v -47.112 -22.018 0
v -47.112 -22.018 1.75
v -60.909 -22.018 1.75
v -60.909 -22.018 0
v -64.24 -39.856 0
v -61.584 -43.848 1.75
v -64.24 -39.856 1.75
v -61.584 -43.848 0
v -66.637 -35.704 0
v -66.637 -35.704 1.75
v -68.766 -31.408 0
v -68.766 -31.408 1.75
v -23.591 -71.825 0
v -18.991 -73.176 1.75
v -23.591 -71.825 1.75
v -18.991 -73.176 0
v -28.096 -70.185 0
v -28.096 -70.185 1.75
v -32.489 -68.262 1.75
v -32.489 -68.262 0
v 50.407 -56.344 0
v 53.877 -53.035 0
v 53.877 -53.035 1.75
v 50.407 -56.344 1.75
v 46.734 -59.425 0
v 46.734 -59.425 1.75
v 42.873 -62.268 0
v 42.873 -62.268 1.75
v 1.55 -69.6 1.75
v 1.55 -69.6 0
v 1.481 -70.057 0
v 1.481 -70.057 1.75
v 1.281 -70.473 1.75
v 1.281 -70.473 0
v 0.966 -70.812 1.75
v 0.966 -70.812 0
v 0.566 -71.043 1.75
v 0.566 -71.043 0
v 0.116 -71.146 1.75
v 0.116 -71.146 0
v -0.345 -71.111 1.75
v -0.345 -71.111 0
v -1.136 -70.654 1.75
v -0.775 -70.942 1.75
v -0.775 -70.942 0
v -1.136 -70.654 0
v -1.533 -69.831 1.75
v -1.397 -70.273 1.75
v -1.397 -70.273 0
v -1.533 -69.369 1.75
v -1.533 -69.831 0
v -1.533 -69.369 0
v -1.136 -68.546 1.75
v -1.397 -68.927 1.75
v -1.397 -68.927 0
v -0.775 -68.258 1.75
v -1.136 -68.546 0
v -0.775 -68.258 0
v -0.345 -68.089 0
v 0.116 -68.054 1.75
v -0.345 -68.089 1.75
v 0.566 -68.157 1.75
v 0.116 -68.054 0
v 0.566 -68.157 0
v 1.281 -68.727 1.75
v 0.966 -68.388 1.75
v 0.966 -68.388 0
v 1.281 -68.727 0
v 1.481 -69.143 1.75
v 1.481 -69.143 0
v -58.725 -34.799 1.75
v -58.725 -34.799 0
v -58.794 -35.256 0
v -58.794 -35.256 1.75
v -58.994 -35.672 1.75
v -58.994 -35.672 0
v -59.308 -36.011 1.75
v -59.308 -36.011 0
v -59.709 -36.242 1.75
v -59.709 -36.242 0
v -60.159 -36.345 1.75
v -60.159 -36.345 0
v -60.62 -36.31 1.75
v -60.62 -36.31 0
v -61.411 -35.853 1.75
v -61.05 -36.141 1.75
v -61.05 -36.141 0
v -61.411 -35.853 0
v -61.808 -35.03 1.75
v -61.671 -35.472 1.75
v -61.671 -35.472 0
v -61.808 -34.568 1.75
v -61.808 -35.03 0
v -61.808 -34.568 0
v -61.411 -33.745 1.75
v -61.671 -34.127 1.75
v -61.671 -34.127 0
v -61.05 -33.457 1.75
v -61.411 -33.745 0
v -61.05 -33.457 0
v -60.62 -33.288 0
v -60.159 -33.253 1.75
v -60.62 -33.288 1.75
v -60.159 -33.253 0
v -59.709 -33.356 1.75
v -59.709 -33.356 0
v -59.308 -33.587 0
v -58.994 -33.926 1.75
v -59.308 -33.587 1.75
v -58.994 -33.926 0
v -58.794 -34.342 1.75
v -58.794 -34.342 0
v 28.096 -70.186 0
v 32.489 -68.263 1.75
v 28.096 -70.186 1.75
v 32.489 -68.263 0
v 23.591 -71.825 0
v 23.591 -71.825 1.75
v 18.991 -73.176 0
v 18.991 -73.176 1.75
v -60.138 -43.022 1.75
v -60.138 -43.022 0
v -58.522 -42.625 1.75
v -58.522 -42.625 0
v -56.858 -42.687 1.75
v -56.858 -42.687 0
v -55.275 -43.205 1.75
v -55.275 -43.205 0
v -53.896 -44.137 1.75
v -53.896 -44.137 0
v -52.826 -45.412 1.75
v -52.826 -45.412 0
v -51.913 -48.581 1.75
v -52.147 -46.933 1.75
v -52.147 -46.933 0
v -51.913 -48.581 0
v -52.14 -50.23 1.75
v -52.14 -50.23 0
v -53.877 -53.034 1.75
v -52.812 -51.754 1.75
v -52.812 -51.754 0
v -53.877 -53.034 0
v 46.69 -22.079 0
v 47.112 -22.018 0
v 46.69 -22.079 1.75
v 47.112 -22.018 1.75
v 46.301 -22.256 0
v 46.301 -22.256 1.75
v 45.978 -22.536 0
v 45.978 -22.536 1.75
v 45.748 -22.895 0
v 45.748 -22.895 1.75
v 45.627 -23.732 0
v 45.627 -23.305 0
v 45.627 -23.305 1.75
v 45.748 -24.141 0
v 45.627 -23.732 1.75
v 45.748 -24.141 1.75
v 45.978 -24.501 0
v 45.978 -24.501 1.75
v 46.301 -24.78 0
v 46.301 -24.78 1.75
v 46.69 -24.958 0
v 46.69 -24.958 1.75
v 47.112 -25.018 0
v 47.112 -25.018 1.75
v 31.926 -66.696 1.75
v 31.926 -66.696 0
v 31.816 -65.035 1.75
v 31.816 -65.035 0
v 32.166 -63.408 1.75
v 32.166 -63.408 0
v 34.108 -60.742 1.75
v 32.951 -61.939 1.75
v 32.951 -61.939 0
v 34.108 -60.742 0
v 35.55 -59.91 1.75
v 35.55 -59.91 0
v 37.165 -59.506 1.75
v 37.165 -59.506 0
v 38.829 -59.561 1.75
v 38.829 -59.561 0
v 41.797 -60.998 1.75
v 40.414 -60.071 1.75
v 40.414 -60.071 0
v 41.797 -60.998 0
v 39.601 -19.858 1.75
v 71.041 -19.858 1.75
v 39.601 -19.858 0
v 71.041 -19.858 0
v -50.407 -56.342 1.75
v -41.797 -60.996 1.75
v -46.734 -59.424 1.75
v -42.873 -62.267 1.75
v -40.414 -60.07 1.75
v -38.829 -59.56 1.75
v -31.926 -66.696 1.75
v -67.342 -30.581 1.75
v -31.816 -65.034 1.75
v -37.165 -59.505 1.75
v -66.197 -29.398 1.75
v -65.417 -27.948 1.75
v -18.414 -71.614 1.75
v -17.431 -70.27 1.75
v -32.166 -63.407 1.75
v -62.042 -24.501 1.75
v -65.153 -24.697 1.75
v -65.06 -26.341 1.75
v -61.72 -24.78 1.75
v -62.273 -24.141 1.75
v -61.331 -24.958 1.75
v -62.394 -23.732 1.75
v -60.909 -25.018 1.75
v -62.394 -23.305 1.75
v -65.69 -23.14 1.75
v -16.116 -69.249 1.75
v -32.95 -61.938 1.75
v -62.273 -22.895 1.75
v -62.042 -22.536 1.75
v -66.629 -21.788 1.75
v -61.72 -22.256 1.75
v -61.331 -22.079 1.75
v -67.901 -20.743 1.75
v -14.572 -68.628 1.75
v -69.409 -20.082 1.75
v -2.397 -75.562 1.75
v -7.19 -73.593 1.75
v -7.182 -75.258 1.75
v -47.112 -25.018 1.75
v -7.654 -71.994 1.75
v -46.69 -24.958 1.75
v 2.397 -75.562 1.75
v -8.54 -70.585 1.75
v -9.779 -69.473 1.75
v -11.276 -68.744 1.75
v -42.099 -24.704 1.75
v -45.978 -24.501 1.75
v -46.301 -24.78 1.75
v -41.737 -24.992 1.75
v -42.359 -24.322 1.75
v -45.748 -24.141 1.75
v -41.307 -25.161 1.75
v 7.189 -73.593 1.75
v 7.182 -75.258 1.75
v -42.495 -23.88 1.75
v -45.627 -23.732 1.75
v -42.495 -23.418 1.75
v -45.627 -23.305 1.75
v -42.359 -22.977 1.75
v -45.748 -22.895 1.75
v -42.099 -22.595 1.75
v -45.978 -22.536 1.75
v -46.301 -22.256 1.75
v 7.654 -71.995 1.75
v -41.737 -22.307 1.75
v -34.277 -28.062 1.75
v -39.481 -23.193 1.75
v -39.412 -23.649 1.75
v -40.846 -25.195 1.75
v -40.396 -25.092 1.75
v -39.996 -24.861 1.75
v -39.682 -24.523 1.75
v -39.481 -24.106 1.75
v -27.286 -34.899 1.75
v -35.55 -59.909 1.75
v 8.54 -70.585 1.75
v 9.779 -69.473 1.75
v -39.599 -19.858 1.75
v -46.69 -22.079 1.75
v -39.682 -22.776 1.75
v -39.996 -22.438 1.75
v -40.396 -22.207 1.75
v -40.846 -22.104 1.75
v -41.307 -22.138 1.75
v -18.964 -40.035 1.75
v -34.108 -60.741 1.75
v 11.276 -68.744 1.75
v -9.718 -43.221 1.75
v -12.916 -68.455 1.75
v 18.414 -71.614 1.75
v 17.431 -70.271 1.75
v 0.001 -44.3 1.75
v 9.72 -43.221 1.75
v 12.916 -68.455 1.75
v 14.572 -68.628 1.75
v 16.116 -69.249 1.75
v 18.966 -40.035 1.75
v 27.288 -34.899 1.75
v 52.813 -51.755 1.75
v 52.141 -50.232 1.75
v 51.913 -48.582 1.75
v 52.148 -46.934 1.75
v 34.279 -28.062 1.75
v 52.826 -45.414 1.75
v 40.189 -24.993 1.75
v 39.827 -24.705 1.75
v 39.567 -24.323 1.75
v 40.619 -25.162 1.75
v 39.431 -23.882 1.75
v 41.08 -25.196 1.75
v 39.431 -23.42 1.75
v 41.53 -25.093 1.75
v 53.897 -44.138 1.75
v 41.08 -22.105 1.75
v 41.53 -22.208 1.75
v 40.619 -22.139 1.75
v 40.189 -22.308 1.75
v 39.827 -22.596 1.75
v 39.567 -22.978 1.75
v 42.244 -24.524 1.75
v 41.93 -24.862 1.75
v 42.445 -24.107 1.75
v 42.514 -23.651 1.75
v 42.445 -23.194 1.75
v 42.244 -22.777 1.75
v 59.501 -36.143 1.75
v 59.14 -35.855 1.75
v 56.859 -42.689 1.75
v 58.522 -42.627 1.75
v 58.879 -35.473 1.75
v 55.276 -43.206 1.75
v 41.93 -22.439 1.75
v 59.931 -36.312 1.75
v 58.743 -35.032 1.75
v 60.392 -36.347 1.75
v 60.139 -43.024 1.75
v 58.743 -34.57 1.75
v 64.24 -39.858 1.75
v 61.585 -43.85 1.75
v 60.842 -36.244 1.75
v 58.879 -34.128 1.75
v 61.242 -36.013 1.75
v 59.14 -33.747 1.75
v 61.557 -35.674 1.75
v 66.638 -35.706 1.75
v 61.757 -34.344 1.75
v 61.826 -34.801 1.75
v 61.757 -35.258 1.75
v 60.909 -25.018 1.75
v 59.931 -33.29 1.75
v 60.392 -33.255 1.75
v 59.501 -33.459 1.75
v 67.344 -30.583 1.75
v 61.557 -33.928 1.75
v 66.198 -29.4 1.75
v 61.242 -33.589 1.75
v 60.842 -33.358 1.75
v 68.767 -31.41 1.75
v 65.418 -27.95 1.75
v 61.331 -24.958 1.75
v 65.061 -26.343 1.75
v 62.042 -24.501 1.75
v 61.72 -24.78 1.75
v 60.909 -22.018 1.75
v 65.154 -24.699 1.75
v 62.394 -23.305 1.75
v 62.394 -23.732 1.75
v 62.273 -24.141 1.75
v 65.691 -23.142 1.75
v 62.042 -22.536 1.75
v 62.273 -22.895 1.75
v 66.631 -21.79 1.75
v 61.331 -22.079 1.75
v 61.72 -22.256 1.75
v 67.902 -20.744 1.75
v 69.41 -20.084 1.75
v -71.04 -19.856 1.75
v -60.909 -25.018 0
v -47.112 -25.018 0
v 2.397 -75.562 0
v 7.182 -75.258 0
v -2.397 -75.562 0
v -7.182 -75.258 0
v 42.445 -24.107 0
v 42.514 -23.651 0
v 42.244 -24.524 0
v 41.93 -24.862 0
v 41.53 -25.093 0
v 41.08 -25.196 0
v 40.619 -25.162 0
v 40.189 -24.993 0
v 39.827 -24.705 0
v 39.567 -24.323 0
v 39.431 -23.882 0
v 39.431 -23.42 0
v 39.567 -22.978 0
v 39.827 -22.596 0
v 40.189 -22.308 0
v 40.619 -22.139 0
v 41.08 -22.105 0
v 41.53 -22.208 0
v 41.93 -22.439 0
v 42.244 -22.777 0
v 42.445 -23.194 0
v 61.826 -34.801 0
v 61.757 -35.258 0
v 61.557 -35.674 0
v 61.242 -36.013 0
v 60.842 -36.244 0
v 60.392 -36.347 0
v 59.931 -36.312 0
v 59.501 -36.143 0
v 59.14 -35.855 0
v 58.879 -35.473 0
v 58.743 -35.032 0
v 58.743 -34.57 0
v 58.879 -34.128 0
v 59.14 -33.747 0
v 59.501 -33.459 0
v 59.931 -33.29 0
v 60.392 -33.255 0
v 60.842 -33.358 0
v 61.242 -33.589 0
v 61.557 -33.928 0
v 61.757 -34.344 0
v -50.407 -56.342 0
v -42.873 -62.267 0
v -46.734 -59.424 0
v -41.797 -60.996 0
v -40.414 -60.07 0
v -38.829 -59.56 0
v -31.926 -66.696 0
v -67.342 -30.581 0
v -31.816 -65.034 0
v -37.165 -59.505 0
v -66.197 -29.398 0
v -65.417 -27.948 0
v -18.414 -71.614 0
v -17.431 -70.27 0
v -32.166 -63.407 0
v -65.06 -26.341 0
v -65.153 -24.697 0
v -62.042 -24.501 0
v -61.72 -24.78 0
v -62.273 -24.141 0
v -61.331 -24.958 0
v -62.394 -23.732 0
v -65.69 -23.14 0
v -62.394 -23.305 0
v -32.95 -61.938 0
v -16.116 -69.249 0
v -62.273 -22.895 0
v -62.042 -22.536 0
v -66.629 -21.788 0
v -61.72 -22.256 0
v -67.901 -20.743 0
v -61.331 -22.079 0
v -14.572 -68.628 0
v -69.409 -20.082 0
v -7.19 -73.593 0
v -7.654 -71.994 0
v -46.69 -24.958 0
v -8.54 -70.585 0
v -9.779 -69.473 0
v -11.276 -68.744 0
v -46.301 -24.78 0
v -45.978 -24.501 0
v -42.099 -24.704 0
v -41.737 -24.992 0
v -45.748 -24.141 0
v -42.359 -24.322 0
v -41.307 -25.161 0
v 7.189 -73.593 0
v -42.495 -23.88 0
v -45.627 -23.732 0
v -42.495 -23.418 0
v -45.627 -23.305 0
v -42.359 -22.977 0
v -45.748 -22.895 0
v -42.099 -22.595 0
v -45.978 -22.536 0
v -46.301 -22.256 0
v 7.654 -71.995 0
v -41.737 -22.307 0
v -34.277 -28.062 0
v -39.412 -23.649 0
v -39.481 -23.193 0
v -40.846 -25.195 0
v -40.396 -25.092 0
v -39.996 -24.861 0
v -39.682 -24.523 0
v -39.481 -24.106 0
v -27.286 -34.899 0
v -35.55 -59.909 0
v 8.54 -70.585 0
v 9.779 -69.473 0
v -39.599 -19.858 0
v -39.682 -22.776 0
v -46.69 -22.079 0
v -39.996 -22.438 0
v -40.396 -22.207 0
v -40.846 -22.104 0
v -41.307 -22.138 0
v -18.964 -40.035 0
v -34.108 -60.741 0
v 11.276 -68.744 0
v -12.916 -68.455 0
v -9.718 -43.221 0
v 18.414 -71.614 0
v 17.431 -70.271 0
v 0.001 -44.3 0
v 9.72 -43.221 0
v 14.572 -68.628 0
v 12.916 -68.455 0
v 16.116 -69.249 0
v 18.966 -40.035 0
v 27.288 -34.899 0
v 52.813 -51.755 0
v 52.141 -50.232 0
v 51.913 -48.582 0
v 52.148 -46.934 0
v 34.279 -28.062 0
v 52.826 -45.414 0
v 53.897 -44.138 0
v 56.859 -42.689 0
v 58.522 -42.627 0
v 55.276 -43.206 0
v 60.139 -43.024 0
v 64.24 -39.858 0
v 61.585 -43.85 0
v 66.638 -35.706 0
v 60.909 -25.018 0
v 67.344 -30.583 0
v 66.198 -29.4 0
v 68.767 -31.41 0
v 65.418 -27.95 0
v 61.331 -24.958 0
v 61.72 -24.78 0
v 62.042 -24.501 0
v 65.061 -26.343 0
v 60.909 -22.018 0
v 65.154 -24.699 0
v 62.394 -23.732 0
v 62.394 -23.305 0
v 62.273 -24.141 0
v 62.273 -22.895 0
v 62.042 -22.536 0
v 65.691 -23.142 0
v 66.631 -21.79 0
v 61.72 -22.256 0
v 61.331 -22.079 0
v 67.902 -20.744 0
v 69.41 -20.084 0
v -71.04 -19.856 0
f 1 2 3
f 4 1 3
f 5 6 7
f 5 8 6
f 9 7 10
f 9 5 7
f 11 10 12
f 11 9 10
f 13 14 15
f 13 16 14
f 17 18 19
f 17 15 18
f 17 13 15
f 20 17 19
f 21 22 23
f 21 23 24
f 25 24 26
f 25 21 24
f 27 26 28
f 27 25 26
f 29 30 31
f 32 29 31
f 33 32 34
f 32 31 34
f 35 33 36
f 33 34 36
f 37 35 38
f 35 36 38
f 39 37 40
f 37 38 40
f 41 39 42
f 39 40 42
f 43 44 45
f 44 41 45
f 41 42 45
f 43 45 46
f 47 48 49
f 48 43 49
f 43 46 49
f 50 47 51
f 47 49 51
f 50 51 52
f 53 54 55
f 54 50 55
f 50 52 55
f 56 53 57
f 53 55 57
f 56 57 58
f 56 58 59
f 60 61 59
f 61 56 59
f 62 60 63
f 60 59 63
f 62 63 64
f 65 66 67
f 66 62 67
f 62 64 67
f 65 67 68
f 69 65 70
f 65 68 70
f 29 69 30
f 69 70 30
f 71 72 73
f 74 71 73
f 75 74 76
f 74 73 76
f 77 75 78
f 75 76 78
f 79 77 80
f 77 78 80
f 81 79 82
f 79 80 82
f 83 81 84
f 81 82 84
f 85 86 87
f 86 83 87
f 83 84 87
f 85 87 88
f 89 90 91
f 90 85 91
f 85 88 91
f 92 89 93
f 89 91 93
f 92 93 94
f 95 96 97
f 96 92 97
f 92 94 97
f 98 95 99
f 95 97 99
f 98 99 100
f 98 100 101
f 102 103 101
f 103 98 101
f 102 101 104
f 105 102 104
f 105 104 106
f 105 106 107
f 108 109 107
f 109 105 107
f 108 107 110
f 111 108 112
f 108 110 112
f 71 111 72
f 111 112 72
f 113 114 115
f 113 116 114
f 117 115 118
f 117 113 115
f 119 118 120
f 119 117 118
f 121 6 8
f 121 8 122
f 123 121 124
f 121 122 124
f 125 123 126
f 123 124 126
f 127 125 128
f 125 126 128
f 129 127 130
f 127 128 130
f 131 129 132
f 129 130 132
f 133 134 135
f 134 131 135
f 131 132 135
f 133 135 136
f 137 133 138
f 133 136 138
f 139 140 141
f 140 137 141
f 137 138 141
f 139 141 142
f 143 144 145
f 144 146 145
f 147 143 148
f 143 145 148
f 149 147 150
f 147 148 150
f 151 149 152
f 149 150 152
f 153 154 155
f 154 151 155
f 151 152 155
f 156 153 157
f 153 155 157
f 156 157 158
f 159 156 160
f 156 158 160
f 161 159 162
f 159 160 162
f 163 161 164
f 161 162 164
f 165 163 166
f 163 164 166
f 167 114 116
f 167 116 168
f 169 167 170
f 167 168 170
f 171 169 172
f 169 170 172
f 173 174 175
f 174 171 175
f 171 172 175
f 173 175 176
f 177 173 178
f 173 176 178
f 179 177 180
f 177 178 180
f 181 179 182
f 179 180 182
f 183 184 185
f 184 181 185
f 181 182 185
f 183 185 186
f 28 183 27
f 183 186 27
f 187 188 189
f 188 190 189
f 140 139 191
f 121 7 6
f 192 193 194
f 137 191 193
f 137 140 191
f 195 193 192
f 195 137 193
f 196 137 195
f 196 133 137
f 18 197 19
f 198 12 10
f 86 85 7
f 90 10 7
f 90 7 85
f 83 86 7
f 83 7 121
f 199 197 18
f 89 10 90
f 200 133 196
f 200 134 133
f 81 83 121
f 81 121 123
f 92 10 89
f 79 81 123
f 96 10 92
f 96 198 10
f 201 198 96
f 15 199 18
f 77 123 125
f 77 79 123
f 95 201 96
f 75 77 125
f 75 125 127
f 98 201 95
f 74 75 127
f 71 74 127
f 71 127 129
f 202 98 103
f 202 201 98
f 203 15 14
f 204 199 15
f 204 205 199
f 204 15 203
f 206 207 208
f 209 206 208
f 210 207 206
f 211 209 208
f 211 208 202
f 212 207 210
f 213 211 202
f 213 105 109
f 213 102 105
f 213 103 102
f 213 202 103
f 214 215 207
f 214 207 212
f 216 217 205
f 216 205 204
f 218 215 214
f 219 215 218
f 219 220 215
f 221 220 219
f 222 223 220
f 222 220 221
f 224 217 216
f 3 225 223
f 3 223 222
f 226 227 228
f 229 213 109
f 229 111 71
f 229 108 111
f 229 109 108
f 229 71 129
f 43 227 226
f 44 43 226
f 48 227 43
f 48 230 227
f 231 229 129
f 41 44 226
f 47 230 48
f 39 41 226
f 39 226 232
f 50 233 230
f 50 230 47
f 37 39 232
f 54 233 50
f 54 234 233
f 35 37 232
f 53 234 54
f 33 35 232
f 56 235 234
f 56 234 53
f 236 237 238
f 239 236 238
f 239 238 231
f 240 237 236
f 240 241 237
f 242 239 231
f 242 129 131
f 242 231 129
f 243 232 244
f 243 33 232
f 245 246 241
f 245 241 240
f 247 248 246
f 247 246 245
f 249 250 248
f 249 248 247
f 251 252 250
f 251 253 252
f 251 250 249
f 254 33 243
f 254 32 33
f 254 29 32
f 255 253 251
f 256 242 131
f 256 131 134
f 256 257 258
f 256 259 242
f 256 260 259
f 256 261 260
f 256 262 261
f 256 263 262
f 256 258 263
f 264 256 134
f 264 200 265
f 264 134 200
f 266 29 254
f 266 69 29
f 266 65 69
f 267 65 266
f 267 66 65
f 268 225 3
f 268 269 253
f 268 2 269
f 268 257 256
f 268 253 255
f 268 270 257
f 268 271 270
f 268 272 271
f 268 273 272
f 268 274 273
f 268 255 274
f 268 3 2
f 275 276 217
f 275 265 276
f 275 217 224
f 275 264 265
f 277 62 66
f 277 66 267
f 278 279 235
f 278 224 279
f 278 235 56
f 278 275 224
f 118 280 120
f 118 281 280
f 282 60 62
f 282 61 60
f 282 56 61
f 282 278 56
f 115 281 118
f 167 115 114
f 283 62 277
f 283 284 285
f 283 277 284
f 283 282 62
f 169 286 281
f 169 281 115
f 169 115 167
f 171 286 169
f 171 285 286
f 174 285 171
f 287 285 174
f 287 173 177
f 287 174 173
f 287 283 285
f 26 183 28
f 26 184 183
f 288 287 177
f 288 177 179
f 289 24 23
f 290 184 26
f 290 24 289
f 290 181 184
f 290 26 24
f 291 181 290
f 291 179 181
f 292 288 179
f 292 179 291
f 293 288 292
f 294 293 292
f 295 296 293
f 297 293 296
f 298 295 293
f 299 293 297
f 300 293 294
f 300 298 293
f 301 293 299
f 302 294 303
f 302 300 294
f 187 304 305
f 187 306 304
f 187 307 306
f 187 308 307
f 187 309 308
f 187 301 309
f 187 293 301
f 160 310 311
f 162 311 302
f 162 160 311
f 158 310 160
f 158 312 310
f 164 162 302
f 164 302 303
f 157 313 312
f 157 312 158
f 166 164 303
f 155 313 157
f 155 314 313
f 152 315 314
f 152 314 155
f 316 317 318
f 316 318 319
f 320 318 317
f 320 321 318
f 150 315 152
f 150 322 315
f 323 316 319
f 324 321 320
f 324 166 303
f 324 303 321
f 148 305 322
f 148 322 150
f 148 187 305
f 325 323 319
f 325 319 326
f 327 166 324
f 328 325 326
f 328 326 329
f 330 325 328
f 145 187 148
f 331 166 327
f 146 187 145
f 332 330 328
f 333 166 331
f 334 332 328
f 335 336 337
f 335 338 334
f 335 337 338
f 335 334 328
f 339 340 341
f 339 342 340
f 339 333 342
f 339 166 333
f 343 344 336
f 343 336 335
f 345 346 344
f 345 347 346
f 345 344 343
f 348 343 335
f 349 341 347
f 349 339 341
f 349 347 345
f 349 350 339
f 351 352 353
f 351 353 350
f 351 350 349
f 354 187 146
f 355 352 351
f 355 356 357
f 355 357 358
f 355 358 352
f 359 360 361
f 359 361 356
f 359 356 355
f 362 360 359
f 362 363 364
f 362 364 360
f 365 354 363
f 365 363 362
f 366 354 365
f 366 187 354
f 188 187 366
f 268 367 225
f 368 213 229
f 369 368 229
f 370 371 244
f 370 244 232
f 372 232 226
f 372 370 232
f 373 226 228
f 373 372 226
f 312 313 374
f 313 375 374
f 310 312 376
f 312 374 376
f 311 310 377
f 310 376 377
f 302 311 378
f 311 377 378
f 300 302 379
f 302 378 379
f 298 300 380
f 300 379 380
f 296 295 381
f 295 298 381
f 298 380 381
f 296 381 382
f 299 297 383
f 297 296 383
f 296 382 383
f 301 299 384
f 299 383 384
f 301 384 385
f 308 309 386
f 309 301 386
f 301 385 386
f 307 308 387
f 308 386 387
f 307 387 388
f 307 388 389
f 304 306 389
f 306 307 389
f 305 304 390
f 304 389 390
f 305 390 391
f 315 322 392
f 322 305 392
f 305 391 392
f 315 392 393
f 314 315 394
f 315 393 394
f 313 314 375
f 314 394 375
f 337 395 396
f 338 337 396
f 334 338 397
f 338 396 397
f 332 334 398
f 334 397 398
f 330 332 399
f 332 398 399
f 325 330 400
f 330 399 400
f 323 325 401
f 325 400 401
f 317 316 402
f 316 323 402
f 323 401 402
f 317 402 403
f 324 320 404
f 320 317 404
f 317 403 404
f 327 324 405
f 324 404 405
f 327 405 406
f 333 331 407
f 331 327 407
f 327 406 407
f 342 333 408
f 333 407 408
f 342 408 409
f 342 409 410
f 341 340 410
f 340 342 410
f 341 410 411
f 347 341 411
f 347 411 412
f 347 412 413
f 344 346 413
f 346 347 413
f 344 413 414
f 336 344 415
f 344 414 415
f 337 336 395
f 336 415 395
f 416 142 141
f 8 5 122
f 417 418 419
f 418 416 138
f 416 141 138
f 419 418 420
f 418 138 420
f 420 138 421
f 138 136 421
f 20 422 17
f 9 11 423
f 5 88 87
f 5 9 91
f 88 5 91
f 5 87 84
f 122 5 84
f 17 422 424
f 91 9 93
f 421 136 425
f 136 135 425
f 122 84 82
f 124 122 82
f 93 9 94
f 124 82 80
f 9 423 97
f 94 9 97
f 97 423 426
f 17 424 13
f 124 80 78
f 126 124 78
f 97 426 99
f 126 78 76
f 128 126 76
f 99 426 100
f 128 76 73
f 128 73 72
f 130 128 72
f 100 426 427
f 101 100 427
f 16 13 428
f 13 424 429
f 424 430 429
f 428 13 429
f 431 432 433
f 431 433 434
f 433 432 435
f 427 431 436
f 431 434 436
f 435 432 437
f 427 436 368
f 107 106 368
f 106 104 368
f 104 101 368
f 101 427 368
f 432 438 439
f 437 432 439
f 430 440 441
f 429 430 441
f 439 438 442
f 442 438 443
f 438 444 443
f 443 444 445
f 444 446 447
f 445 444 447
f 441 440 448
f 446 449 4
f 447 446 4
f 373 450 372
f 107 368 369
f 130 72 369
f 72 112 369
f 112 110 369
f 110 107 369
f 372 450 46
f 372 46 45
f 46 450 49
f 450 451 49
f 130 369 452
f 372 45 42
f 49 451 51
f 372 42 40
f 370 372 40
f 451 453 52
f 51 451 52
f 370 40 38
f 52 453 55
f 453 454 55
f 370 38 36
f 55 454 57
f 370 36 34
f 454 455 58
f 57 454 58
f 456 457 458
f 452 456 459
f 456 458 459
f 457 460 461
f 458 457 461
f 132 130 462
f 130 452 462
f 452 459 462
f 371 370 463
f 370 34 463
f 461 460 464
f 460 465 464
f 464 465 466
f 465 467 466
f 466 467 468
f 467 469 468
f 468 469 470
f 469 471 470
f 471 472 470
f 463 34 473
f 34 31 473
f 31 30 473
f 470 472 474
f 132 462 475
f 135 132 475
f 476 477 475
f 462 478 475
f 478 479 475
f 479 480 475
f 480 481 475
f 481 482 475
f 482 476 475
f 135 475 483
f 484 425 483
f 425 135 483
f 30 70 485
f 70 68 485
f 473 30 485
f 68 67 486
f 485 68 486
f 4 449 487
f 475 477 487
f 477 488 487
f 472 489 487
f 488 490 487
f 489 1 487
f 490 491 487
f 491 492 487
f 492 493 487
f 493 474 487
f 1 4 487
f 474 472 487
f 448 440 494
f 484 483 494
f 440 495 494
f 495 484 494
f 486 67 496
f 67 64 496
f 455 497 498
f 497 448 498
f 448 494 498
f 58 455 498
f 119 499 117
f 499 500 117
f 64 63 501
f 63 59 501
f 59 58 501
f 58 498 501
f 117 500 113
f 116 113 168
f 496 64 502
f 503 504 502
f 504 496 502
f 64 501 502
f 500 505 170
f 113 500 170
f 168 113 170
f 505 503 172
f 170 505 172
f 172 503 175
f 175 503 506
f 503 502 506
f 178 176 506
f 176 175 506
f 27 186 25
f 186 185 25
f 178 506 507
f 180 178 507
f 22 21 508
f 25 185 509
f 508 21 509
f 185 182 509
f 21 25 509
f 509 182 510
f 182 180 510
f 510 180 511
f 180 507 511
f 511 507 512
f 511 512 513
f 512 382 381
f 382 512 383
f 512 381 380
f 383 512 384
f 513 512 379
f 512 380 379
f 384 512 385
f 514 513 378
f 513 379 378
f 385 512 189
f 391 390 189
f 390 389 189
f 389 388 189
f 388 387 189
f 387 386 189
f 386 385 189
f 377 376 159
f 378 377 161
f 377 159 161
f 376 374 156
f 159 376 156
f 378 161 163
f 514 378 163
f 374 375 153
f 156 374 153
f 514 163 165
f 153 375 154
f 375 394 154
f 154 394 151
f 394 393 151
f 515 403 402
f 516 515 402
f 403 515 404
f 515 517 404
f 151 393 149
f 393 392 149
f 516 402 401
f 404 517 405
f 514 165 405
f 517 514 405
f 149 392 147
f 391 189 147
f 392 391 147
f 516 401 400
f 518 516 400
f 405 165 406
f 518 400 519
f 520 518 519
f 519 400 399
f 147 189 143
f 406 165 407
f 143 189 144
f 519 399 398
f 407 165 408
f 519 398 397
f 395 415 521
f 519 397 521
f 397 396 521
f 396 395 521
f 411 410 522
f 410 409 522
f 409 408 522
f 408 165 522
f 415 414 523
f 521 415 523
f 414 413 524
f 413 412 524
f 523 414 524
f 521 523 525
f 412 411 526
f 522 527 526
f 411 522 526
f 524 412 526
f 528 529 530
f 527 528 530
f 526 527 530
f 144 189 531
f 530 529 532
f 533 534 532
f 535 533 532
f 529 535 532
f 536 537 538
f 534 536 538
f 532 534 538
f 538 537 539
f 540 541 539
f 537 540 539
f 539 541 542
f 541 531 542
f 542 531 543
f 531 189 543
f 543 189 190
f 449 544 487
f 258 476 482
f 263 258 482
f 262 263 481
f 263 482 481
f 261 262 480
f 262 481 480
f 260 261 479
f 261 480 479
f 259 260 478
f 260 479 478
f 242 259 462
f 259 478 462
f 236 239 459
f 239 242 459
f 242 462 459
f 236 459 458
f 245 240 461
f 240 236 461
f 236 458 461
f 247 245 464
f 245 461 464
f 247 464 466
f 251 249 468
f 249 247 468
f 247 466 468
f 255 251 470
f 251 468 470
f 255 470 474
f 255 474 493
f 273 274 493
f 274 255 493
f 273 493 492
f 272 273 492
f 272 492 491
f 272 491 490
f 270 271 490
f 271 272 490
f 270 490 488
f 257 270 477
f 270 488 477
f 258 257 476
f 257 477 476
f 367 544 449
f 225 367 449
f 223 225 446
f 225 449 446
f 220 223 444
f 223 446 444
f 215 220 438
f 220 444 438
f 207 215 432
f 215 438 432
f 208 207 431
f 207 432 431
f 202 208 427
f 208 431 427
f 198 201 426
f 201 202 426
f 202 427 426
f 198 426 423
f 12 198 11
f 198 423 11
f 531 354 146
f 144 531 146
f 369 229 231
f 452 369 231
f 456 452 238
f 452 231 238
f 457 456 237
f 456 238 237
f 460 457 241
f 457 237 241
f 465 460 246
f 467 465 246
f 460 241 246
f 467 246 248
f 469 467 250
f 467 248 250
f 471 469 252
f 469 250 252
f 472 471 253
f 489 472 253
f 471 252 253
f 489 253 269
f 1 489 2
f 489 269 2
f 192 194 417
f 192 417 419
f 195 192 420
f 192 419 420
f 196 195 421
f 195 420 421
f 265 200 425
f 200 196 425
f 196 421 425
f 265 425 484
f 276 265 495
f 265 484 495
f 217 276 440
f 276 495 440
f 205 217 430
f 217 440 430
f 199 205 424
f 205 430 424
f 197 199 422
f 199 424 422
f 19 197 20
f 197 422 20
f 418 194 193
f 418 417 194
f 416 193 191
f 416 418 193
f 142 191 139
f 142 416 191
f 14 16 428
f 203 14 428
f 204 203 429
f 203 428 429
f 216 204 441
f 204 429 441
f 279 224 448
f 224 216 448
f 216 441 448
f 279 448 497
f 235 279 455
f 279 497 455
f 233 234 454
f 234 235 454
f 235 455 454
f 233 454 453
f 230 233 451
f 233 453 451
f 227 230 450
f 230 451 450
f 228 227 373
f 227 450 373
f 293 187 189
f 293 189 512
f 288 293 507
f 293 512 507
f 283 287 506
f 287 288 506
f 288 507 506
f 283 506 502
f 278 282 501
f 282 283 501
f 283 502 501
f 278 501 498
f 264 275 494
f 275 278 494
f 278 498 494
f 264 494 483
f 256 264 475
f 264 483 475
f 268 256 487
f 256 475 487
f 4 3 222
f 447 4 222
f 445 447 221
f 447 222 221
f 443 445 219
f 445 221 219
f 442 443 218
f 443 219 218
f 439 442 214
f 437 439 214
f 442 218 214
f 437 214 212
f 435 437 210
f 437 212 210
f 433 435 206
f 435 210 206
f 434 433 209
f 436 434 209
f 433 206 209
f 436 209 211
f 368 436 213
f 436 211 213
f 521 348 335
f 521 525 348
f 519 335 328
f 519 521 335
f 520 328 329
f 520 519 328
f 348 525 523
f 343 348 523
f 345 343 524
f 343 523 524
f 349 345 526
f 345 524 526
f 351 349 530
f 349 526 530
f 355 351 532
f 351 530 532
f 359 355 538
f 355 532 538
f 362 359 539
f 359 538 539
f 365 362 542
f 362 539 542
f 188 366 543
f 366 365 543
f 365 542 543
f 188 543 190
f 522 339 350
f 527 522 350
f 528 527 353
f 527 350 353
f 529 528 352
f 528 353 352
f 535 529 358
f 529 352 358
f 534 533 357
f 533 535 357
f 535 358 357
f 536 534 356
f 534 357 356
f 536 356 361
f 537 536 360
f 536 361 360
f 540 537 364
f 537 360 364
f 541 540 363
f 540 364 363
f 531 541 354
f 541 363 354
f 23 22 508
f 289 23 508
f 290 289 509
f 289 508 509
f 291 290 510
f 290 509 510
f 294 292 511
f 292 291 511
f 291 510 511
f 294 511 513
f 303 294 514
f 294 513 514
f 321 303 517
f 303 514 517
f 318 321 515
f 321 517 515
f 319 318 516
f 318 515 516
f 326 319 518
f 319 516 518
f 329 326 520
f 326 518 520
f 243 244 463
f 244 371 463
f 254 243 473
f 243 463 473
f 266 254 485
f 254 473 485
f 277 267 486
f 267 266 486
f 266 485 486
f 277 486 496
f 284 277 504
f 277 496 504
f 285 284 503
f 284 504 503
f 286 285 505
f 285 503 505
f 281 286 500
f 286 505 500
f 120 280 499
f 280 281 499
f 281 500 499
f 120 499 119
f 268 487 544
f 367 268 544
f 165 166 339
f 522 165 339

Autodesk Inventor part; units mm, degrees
ref_plane "YZ Plane" through (0, 0, 0) normal (1, 0, 0) x (0, 1, 0)
ref_plane "XZ Plane" through (0, 0, 0) normal (0, 1, 0) x (-1, 0, 0)
ref_plane "XY Plane" through (0, 0, 0) normal (0, 0, 1) x (1, 0, 0)
sketch "Sketch1" plane through (0, 0, 0) normal (0, 0, 1) x (1, 0, 0)
  circle A0 centre (46.9462, 34.742) radius 1.05 projected
  circle A1 centre (53.415, 34.1058) radius 1.05 projected
  circle A2 centre (-46.9442, -34.742) radius 1.05 construction
  circle A3 centre (-53.413, -34.1058) radius 1.05 construction
  arc A4 (72.8682, -20.1426) -> (68.7671, -31.41) centre (71.0414, -25.8577) ccw projected
  arc A5 (72.8682, -20.1426) -> (72.8688, 20.1405) centre (0.001, 0) ccw projected
  arc A6 (68.768, 31.408) -> (72.8688, 20.1405) centre (71.0421, 25.8557) ccw projected
  arc A7 (68.768, 31.408) -> (61.5859, 43.8482) centre (0.001, 0) ccw projected
  arc A8 (53.8786, 53.0336) -> (61.5859, 43.8482) centre (57.9147, 48.5939) ccw projected
  arc A9 (53.8786, 53.0336) -> (42.8749, 62.2671) centre (0.001, 0) ccw projected
  arc A10 (32.4909, 68.2625) -> (42.8749, 62.2671) centre (37.8019, 65.471) ccw projected
  arc A11 (32.4909, 68.2625) -> (18.9927, 73.1756) centre (0.001, 0) ccw projected
  arc A12 (7.1843, 75.258) -> (18.9927, 73.1756) centre (13.1299, 74.4513) ccw projected
  arc A13 (7.1843, 75.258) -> (-7.1802, 75.2582) centre (0.001, 0) ccw projected
  arc A14 (-18.9886, 73.1762) -> (-7.1802, 75.2582) centre (-13.1257, 74.4517) ccw projected
  arc A15 (-18.9886, 73.1762) -> (-32.4869, 68.2634) centre (0.001, 0) ccw projected
  arc A16 (-42.8711, 62.2683) -> (-32.4869, 68.2634) centre (-37.7981, 65.4721) ccw projected
  arc A17 (-42.8711, 62.2683) -> (-53.8751, 53.0351) centre (0.001, 0) ccw projected
  arc A18 (-61.5826, 43.8499) -> (-53.8751, 53.0351) centre (-57.9113, 48.5956) ccw projected
  arc A19 (-61.5826, 43.8499) -> (-68.7651, 31.41) centre (0.001, 0) ccw projected
  arc A20 (-72.8662, 20.1426) -> (-68.7651, 31.41) centre (-71.0394, 25.8577) ccw projected
  arc A21 (-72.8662, 20.1426) -> (-72.8668, -20.1405) centre (0.001, 0) ccw projected
  arc A22 (-68.766, -31.408) -> (-72.8668, -20.1405) centre (-71.0401, -25.8557) ccw projected
  arc A23 (-68.766, -31.408) -> (-61.5839, -43.8482) centre (0.001, 0) ccw projected
  arc A24 (-53.8766, -53.0336) -> (-61.5839, -43.8482) centre (-57.9127, -48.5939) ccw projected
  arc A25 (-53.8766, -53.0336) -> (-42.8729, -62.2671) centre (0.001, 0) ccw projected
  arc A26 (-32.4889, -68.2625) -> (-42.8729, -62.2671) centre (-37.7999, -65.471) ccw projected
  arc A27 (-32.4889, -68.2625) -> (-18.9907, -73.1756) centre (0.001, 0) ccw projected
  arc A28 (-7.1823, -75.258) -> (-18.9907, -73.1756) centre (-13.1279, -74.4513) ccw projected
  arc A29 (-7.1823, -75.258) -> (7.1822, -75.2582) centre (0.001, 0) ccw projected
  arc A30 (18.9906, -73.1762) -> (7.1822, -75.2582) centre (13.1277, -74.4517) ccw projected
  arc A31 (18.9906, -73.1762) -> (32.4889, -68.2634) centre (0.001, 0) ccw projected
  arc A32 (42.8731, -62.2683) -> (32.4889, -68.2634) centre (37.8001, -65.4721) ccw projected
  arc A33 (42.8731, -62.2683) -> (53.8771, -53.0351) centre (0.001, 0) ccw projected
  arc A34 (61.5846, -43.8499) -> (53.8771, -53.0351) centre (57.9133, -48.5956) ccw projected
  arc A35 (61.5846, -43.8499) -> (68.7671, -31.41) centre (0.001, 0) ccw projected
  circle A36 centre (0.001, 0) radius 44.3 projected
  circle A37 centre (-69.9492, -11.499) radius 1.3 projected
  circle A38 centre (-46.9488, 11.5007) radius 1.3 projected
  circle A39 centre (69.9508, -11.501) radius 1.3 projected
  circle A40 centre (46.9512, 11.4993) radius 1.3 projected
  circle A41 centre (69.9512, 11.499) radius 1.3 projected
  circle A42 centre (46.9508, -11.5007) radius 1.3 projected
  circle A43 centre (-69.9488, 11.501) radius 1.3 projected
  circle A44 centre (-46.9492, -11.4993) radius 1.3 projected
  circle A45 centre (-58.449, 0.0008) radius 11.5 projected
  circle A46 centre (58.451, -0.0008) radius 11.5 projected
  circle A47 centre (60.2759, -34.8009) radius 1.55 projected
  circle A48 centre (44.7383, -53.3173) radius 1.55 projected
  circle A49 centre (16.1779, -44.4477) radius 1.55 projected
  circle A50 centre (0, -69.6) radius 1.55 projected
  circle A51 centre (-23.8045, -65.4023) radius 1.55 projected
  circle A52 centre (-30.4034, -36.2335) radius 1.55 projected
  circle A53 centre (-60.2749, -34.7991) radius 1.55 projected
  circle A54 centre (60.2769, 34.7991) radius 1.55 projected
  circle A55 centre (44.7398, 53.3161) radius 1.55 projected
  circle A56 centre (23.8065, 65.4023) radius 1.55 projected
  circle A57 centre (-40.9617, 23.6506) radius 1.55 projected
  circle A58 centre (-30.4023, 36.2343) radius 1.55 projected
  circle A59 centre (-16.1759, 44.4477) radius 1.55 projected
  circle A60 centre (0.0017, 47.3) radius 1.55 projected
  circle A61 centre (0.002, 69.6) radius 1.55 projected
  circle A62 centre (-23.8027, 65.4029) radius 1.55 projected
  circle A63 centre (-44.7363, 53.3173) radius 1.55 projected
  circle A64 centre (-60.2739, 34.8009) radius 1.55 projected
  circle A65 centre (16.1792, 44.4472) radius 1.55 projected
  circle A66 centre (30.4054, 36.2335) radius 1.55 projected
  circle A67 centre (40.9643, 23.6494) radius 1.55 projected
  circle A68 centre (-40.9623, -23.6494) radius 1.55 projected
  circle A69 centre (-44.7378, -53.3161) radius 1.55 projected
  circle A70 centre (-16.1772, -44.4472) radius 1.55 projected
  circle A71 centre (0.0003, -47.3) radius 1.55 projected
  circle A72 centre (23.8047, -65.4029) radius 1.55 projected
  circle A73 centre (30.4043, -36.2343) radius 1.55 projected
  circle A74 centre (40.9637, -23.6506) radius 1.55 projected
  line L0 (58.451, 0) -> (0.001, 0) construction
  line L1 (71.0414, -19.8577) -> (39.601, -19.8577)
  line L2 (0.001, 0) -> (0.001, -87.4041) construction
  line L3 (71.0414, -25.8577) -> (71.0414, -19.8577) construction
  line L4 (39.601, -19.8577) -> (-39.599, -19.8577) construction
  line L5 (-39.599, -19.8577) -> (-71.0397, -19.8557)
  point P0 (0, 0)
extrude "Extrusion1" add sketch "Sketch1" along normal blind 1.75 contours A4 A35 A34 A33 A32 A31 A30 A29 A28 A27 A26 A25 A24 A23 A22 L5 A36 L1
sketch "Sketch2" plane through (0, 0, 1.75) normal (0, 0, 1) x (1, 0, 0)
  circle A0 centre (-30.4034, -36.2335) radius 1.55 projected
  circle A1 centre (-44.7378, -53.3161) radius 1.55 projected
  circle A2 centre (-23.8045, -65.4023) radius 1.55 projected
  circle A3 centre (-16.1772, -44.4472) radius 1.55 projected
  circle A4 centre (16.1779, -44.4477) radius 1.55 projected
  circle A5 centre (23.8047, -65.4029) radius 1.55 projected
  circle A6 centre (44.7383, -53.3173) radius 1.55 projected
  circle A7 centre (30.4043, -36.2343) radius 1.55 projected
  circle A8 centre (0.0003, -47.3) radius 1.55 projected
  point P0 (0, 0)
extrude "Extrusion2" add sketch "Sketch2" against normal up to surface (1.75 mm away)
sketch "Sketch3" plane through (0, 0, 1.75) normal (0, 0, 1) x (1, 0, 0)
  line L0 (-60.9088, -23.5183) -> (-47.1121, -23.5183) construction
  line L1 (-60.9088, -25.0183) -> (-47.1121, -25.0183)
  line L2 (-47.1121, -22.0183) -> (-60.9088, -22.0183)
  arc A0 (-60.9088, -22.0183) -> (-60.9088, -25.0183) centre (-60.9088, -23.5183) ccw
  arc A1 (-47.1121, -25.0183) -> (-47.1121, -22.0183) centre (-47.1121, -23.5183) ccw
  line L3 (-60.9088, -23.5183) -> (-65.5141, -23.5183) construction
  arc A2 (-68.766, -31.408) -> (-71.0397, -19.8557) centre (-71.0401, -25.8557) ccw projected
  line L4 (-47.1121, -23.5183) -> (-42.5068, -23.5183) construction
  circle A3 centre (-40.9623, -23.6494) radius 1.55 projected
  point P0 (0, 0)
  point P1 (-54.0105, -23.5183)
  point P2 (-71.0401, -19.8557)
  dimension "d4" = 3
extrude "Extrusion3" cut sketch "Sketch3" against normal up to surface (1.75 mm away) contours A0 L2 A1 L1
mirror "Mirror1" about plane through (0, 0, 0) normal (1, 0, 0) of "Extrusion3"
sketch "Sketch4" plane through (0, 0, 1.75) normal (0, 0, 1) x (1, 0, 0)
  line L0 (13.6094, 45.369) -> (8.7511, 46.5508) construction
  line L1 (13.8458, 46.3407) -> (8.9875, 47.5225)
  line L2 (8.5148, 45.5792) -> (13.3731, 44.3973)
  arc A0 (13.3731, 44.3973) -> (13.8458, 46.3407) centre (13.6094, 45.369) ccw
  arc A1 (8.9875, 47.5225) -> (8.5148, 45.5792) centre (8.7511, 46.5508) ccw
  circle A2 centre (0, 0) radius 47.3002 construction
  arc A3 (-39.599, -19.8577) -> (39.601, -19.8577) centre (0.001, 0) ccw projected
  point P0 (11.1803, 45.9599)
  point P1 (-39.6, -19.8557)
  dimension "d7" = 2
  dimension "d8" = 5
  dimension "d9" = 2
extrude "Extrusion4" cut sketch "Sketch4" against normal up to surface (1.75 mm away)
equation "\"d0\" = board_height"
equation "\"d2\" = board_height"
equation "\"d5\" = board_height"
equation "\"d10\" = board_height"
equation "\"board_height\" = 1.75"
properties part number "Board_Shape"
